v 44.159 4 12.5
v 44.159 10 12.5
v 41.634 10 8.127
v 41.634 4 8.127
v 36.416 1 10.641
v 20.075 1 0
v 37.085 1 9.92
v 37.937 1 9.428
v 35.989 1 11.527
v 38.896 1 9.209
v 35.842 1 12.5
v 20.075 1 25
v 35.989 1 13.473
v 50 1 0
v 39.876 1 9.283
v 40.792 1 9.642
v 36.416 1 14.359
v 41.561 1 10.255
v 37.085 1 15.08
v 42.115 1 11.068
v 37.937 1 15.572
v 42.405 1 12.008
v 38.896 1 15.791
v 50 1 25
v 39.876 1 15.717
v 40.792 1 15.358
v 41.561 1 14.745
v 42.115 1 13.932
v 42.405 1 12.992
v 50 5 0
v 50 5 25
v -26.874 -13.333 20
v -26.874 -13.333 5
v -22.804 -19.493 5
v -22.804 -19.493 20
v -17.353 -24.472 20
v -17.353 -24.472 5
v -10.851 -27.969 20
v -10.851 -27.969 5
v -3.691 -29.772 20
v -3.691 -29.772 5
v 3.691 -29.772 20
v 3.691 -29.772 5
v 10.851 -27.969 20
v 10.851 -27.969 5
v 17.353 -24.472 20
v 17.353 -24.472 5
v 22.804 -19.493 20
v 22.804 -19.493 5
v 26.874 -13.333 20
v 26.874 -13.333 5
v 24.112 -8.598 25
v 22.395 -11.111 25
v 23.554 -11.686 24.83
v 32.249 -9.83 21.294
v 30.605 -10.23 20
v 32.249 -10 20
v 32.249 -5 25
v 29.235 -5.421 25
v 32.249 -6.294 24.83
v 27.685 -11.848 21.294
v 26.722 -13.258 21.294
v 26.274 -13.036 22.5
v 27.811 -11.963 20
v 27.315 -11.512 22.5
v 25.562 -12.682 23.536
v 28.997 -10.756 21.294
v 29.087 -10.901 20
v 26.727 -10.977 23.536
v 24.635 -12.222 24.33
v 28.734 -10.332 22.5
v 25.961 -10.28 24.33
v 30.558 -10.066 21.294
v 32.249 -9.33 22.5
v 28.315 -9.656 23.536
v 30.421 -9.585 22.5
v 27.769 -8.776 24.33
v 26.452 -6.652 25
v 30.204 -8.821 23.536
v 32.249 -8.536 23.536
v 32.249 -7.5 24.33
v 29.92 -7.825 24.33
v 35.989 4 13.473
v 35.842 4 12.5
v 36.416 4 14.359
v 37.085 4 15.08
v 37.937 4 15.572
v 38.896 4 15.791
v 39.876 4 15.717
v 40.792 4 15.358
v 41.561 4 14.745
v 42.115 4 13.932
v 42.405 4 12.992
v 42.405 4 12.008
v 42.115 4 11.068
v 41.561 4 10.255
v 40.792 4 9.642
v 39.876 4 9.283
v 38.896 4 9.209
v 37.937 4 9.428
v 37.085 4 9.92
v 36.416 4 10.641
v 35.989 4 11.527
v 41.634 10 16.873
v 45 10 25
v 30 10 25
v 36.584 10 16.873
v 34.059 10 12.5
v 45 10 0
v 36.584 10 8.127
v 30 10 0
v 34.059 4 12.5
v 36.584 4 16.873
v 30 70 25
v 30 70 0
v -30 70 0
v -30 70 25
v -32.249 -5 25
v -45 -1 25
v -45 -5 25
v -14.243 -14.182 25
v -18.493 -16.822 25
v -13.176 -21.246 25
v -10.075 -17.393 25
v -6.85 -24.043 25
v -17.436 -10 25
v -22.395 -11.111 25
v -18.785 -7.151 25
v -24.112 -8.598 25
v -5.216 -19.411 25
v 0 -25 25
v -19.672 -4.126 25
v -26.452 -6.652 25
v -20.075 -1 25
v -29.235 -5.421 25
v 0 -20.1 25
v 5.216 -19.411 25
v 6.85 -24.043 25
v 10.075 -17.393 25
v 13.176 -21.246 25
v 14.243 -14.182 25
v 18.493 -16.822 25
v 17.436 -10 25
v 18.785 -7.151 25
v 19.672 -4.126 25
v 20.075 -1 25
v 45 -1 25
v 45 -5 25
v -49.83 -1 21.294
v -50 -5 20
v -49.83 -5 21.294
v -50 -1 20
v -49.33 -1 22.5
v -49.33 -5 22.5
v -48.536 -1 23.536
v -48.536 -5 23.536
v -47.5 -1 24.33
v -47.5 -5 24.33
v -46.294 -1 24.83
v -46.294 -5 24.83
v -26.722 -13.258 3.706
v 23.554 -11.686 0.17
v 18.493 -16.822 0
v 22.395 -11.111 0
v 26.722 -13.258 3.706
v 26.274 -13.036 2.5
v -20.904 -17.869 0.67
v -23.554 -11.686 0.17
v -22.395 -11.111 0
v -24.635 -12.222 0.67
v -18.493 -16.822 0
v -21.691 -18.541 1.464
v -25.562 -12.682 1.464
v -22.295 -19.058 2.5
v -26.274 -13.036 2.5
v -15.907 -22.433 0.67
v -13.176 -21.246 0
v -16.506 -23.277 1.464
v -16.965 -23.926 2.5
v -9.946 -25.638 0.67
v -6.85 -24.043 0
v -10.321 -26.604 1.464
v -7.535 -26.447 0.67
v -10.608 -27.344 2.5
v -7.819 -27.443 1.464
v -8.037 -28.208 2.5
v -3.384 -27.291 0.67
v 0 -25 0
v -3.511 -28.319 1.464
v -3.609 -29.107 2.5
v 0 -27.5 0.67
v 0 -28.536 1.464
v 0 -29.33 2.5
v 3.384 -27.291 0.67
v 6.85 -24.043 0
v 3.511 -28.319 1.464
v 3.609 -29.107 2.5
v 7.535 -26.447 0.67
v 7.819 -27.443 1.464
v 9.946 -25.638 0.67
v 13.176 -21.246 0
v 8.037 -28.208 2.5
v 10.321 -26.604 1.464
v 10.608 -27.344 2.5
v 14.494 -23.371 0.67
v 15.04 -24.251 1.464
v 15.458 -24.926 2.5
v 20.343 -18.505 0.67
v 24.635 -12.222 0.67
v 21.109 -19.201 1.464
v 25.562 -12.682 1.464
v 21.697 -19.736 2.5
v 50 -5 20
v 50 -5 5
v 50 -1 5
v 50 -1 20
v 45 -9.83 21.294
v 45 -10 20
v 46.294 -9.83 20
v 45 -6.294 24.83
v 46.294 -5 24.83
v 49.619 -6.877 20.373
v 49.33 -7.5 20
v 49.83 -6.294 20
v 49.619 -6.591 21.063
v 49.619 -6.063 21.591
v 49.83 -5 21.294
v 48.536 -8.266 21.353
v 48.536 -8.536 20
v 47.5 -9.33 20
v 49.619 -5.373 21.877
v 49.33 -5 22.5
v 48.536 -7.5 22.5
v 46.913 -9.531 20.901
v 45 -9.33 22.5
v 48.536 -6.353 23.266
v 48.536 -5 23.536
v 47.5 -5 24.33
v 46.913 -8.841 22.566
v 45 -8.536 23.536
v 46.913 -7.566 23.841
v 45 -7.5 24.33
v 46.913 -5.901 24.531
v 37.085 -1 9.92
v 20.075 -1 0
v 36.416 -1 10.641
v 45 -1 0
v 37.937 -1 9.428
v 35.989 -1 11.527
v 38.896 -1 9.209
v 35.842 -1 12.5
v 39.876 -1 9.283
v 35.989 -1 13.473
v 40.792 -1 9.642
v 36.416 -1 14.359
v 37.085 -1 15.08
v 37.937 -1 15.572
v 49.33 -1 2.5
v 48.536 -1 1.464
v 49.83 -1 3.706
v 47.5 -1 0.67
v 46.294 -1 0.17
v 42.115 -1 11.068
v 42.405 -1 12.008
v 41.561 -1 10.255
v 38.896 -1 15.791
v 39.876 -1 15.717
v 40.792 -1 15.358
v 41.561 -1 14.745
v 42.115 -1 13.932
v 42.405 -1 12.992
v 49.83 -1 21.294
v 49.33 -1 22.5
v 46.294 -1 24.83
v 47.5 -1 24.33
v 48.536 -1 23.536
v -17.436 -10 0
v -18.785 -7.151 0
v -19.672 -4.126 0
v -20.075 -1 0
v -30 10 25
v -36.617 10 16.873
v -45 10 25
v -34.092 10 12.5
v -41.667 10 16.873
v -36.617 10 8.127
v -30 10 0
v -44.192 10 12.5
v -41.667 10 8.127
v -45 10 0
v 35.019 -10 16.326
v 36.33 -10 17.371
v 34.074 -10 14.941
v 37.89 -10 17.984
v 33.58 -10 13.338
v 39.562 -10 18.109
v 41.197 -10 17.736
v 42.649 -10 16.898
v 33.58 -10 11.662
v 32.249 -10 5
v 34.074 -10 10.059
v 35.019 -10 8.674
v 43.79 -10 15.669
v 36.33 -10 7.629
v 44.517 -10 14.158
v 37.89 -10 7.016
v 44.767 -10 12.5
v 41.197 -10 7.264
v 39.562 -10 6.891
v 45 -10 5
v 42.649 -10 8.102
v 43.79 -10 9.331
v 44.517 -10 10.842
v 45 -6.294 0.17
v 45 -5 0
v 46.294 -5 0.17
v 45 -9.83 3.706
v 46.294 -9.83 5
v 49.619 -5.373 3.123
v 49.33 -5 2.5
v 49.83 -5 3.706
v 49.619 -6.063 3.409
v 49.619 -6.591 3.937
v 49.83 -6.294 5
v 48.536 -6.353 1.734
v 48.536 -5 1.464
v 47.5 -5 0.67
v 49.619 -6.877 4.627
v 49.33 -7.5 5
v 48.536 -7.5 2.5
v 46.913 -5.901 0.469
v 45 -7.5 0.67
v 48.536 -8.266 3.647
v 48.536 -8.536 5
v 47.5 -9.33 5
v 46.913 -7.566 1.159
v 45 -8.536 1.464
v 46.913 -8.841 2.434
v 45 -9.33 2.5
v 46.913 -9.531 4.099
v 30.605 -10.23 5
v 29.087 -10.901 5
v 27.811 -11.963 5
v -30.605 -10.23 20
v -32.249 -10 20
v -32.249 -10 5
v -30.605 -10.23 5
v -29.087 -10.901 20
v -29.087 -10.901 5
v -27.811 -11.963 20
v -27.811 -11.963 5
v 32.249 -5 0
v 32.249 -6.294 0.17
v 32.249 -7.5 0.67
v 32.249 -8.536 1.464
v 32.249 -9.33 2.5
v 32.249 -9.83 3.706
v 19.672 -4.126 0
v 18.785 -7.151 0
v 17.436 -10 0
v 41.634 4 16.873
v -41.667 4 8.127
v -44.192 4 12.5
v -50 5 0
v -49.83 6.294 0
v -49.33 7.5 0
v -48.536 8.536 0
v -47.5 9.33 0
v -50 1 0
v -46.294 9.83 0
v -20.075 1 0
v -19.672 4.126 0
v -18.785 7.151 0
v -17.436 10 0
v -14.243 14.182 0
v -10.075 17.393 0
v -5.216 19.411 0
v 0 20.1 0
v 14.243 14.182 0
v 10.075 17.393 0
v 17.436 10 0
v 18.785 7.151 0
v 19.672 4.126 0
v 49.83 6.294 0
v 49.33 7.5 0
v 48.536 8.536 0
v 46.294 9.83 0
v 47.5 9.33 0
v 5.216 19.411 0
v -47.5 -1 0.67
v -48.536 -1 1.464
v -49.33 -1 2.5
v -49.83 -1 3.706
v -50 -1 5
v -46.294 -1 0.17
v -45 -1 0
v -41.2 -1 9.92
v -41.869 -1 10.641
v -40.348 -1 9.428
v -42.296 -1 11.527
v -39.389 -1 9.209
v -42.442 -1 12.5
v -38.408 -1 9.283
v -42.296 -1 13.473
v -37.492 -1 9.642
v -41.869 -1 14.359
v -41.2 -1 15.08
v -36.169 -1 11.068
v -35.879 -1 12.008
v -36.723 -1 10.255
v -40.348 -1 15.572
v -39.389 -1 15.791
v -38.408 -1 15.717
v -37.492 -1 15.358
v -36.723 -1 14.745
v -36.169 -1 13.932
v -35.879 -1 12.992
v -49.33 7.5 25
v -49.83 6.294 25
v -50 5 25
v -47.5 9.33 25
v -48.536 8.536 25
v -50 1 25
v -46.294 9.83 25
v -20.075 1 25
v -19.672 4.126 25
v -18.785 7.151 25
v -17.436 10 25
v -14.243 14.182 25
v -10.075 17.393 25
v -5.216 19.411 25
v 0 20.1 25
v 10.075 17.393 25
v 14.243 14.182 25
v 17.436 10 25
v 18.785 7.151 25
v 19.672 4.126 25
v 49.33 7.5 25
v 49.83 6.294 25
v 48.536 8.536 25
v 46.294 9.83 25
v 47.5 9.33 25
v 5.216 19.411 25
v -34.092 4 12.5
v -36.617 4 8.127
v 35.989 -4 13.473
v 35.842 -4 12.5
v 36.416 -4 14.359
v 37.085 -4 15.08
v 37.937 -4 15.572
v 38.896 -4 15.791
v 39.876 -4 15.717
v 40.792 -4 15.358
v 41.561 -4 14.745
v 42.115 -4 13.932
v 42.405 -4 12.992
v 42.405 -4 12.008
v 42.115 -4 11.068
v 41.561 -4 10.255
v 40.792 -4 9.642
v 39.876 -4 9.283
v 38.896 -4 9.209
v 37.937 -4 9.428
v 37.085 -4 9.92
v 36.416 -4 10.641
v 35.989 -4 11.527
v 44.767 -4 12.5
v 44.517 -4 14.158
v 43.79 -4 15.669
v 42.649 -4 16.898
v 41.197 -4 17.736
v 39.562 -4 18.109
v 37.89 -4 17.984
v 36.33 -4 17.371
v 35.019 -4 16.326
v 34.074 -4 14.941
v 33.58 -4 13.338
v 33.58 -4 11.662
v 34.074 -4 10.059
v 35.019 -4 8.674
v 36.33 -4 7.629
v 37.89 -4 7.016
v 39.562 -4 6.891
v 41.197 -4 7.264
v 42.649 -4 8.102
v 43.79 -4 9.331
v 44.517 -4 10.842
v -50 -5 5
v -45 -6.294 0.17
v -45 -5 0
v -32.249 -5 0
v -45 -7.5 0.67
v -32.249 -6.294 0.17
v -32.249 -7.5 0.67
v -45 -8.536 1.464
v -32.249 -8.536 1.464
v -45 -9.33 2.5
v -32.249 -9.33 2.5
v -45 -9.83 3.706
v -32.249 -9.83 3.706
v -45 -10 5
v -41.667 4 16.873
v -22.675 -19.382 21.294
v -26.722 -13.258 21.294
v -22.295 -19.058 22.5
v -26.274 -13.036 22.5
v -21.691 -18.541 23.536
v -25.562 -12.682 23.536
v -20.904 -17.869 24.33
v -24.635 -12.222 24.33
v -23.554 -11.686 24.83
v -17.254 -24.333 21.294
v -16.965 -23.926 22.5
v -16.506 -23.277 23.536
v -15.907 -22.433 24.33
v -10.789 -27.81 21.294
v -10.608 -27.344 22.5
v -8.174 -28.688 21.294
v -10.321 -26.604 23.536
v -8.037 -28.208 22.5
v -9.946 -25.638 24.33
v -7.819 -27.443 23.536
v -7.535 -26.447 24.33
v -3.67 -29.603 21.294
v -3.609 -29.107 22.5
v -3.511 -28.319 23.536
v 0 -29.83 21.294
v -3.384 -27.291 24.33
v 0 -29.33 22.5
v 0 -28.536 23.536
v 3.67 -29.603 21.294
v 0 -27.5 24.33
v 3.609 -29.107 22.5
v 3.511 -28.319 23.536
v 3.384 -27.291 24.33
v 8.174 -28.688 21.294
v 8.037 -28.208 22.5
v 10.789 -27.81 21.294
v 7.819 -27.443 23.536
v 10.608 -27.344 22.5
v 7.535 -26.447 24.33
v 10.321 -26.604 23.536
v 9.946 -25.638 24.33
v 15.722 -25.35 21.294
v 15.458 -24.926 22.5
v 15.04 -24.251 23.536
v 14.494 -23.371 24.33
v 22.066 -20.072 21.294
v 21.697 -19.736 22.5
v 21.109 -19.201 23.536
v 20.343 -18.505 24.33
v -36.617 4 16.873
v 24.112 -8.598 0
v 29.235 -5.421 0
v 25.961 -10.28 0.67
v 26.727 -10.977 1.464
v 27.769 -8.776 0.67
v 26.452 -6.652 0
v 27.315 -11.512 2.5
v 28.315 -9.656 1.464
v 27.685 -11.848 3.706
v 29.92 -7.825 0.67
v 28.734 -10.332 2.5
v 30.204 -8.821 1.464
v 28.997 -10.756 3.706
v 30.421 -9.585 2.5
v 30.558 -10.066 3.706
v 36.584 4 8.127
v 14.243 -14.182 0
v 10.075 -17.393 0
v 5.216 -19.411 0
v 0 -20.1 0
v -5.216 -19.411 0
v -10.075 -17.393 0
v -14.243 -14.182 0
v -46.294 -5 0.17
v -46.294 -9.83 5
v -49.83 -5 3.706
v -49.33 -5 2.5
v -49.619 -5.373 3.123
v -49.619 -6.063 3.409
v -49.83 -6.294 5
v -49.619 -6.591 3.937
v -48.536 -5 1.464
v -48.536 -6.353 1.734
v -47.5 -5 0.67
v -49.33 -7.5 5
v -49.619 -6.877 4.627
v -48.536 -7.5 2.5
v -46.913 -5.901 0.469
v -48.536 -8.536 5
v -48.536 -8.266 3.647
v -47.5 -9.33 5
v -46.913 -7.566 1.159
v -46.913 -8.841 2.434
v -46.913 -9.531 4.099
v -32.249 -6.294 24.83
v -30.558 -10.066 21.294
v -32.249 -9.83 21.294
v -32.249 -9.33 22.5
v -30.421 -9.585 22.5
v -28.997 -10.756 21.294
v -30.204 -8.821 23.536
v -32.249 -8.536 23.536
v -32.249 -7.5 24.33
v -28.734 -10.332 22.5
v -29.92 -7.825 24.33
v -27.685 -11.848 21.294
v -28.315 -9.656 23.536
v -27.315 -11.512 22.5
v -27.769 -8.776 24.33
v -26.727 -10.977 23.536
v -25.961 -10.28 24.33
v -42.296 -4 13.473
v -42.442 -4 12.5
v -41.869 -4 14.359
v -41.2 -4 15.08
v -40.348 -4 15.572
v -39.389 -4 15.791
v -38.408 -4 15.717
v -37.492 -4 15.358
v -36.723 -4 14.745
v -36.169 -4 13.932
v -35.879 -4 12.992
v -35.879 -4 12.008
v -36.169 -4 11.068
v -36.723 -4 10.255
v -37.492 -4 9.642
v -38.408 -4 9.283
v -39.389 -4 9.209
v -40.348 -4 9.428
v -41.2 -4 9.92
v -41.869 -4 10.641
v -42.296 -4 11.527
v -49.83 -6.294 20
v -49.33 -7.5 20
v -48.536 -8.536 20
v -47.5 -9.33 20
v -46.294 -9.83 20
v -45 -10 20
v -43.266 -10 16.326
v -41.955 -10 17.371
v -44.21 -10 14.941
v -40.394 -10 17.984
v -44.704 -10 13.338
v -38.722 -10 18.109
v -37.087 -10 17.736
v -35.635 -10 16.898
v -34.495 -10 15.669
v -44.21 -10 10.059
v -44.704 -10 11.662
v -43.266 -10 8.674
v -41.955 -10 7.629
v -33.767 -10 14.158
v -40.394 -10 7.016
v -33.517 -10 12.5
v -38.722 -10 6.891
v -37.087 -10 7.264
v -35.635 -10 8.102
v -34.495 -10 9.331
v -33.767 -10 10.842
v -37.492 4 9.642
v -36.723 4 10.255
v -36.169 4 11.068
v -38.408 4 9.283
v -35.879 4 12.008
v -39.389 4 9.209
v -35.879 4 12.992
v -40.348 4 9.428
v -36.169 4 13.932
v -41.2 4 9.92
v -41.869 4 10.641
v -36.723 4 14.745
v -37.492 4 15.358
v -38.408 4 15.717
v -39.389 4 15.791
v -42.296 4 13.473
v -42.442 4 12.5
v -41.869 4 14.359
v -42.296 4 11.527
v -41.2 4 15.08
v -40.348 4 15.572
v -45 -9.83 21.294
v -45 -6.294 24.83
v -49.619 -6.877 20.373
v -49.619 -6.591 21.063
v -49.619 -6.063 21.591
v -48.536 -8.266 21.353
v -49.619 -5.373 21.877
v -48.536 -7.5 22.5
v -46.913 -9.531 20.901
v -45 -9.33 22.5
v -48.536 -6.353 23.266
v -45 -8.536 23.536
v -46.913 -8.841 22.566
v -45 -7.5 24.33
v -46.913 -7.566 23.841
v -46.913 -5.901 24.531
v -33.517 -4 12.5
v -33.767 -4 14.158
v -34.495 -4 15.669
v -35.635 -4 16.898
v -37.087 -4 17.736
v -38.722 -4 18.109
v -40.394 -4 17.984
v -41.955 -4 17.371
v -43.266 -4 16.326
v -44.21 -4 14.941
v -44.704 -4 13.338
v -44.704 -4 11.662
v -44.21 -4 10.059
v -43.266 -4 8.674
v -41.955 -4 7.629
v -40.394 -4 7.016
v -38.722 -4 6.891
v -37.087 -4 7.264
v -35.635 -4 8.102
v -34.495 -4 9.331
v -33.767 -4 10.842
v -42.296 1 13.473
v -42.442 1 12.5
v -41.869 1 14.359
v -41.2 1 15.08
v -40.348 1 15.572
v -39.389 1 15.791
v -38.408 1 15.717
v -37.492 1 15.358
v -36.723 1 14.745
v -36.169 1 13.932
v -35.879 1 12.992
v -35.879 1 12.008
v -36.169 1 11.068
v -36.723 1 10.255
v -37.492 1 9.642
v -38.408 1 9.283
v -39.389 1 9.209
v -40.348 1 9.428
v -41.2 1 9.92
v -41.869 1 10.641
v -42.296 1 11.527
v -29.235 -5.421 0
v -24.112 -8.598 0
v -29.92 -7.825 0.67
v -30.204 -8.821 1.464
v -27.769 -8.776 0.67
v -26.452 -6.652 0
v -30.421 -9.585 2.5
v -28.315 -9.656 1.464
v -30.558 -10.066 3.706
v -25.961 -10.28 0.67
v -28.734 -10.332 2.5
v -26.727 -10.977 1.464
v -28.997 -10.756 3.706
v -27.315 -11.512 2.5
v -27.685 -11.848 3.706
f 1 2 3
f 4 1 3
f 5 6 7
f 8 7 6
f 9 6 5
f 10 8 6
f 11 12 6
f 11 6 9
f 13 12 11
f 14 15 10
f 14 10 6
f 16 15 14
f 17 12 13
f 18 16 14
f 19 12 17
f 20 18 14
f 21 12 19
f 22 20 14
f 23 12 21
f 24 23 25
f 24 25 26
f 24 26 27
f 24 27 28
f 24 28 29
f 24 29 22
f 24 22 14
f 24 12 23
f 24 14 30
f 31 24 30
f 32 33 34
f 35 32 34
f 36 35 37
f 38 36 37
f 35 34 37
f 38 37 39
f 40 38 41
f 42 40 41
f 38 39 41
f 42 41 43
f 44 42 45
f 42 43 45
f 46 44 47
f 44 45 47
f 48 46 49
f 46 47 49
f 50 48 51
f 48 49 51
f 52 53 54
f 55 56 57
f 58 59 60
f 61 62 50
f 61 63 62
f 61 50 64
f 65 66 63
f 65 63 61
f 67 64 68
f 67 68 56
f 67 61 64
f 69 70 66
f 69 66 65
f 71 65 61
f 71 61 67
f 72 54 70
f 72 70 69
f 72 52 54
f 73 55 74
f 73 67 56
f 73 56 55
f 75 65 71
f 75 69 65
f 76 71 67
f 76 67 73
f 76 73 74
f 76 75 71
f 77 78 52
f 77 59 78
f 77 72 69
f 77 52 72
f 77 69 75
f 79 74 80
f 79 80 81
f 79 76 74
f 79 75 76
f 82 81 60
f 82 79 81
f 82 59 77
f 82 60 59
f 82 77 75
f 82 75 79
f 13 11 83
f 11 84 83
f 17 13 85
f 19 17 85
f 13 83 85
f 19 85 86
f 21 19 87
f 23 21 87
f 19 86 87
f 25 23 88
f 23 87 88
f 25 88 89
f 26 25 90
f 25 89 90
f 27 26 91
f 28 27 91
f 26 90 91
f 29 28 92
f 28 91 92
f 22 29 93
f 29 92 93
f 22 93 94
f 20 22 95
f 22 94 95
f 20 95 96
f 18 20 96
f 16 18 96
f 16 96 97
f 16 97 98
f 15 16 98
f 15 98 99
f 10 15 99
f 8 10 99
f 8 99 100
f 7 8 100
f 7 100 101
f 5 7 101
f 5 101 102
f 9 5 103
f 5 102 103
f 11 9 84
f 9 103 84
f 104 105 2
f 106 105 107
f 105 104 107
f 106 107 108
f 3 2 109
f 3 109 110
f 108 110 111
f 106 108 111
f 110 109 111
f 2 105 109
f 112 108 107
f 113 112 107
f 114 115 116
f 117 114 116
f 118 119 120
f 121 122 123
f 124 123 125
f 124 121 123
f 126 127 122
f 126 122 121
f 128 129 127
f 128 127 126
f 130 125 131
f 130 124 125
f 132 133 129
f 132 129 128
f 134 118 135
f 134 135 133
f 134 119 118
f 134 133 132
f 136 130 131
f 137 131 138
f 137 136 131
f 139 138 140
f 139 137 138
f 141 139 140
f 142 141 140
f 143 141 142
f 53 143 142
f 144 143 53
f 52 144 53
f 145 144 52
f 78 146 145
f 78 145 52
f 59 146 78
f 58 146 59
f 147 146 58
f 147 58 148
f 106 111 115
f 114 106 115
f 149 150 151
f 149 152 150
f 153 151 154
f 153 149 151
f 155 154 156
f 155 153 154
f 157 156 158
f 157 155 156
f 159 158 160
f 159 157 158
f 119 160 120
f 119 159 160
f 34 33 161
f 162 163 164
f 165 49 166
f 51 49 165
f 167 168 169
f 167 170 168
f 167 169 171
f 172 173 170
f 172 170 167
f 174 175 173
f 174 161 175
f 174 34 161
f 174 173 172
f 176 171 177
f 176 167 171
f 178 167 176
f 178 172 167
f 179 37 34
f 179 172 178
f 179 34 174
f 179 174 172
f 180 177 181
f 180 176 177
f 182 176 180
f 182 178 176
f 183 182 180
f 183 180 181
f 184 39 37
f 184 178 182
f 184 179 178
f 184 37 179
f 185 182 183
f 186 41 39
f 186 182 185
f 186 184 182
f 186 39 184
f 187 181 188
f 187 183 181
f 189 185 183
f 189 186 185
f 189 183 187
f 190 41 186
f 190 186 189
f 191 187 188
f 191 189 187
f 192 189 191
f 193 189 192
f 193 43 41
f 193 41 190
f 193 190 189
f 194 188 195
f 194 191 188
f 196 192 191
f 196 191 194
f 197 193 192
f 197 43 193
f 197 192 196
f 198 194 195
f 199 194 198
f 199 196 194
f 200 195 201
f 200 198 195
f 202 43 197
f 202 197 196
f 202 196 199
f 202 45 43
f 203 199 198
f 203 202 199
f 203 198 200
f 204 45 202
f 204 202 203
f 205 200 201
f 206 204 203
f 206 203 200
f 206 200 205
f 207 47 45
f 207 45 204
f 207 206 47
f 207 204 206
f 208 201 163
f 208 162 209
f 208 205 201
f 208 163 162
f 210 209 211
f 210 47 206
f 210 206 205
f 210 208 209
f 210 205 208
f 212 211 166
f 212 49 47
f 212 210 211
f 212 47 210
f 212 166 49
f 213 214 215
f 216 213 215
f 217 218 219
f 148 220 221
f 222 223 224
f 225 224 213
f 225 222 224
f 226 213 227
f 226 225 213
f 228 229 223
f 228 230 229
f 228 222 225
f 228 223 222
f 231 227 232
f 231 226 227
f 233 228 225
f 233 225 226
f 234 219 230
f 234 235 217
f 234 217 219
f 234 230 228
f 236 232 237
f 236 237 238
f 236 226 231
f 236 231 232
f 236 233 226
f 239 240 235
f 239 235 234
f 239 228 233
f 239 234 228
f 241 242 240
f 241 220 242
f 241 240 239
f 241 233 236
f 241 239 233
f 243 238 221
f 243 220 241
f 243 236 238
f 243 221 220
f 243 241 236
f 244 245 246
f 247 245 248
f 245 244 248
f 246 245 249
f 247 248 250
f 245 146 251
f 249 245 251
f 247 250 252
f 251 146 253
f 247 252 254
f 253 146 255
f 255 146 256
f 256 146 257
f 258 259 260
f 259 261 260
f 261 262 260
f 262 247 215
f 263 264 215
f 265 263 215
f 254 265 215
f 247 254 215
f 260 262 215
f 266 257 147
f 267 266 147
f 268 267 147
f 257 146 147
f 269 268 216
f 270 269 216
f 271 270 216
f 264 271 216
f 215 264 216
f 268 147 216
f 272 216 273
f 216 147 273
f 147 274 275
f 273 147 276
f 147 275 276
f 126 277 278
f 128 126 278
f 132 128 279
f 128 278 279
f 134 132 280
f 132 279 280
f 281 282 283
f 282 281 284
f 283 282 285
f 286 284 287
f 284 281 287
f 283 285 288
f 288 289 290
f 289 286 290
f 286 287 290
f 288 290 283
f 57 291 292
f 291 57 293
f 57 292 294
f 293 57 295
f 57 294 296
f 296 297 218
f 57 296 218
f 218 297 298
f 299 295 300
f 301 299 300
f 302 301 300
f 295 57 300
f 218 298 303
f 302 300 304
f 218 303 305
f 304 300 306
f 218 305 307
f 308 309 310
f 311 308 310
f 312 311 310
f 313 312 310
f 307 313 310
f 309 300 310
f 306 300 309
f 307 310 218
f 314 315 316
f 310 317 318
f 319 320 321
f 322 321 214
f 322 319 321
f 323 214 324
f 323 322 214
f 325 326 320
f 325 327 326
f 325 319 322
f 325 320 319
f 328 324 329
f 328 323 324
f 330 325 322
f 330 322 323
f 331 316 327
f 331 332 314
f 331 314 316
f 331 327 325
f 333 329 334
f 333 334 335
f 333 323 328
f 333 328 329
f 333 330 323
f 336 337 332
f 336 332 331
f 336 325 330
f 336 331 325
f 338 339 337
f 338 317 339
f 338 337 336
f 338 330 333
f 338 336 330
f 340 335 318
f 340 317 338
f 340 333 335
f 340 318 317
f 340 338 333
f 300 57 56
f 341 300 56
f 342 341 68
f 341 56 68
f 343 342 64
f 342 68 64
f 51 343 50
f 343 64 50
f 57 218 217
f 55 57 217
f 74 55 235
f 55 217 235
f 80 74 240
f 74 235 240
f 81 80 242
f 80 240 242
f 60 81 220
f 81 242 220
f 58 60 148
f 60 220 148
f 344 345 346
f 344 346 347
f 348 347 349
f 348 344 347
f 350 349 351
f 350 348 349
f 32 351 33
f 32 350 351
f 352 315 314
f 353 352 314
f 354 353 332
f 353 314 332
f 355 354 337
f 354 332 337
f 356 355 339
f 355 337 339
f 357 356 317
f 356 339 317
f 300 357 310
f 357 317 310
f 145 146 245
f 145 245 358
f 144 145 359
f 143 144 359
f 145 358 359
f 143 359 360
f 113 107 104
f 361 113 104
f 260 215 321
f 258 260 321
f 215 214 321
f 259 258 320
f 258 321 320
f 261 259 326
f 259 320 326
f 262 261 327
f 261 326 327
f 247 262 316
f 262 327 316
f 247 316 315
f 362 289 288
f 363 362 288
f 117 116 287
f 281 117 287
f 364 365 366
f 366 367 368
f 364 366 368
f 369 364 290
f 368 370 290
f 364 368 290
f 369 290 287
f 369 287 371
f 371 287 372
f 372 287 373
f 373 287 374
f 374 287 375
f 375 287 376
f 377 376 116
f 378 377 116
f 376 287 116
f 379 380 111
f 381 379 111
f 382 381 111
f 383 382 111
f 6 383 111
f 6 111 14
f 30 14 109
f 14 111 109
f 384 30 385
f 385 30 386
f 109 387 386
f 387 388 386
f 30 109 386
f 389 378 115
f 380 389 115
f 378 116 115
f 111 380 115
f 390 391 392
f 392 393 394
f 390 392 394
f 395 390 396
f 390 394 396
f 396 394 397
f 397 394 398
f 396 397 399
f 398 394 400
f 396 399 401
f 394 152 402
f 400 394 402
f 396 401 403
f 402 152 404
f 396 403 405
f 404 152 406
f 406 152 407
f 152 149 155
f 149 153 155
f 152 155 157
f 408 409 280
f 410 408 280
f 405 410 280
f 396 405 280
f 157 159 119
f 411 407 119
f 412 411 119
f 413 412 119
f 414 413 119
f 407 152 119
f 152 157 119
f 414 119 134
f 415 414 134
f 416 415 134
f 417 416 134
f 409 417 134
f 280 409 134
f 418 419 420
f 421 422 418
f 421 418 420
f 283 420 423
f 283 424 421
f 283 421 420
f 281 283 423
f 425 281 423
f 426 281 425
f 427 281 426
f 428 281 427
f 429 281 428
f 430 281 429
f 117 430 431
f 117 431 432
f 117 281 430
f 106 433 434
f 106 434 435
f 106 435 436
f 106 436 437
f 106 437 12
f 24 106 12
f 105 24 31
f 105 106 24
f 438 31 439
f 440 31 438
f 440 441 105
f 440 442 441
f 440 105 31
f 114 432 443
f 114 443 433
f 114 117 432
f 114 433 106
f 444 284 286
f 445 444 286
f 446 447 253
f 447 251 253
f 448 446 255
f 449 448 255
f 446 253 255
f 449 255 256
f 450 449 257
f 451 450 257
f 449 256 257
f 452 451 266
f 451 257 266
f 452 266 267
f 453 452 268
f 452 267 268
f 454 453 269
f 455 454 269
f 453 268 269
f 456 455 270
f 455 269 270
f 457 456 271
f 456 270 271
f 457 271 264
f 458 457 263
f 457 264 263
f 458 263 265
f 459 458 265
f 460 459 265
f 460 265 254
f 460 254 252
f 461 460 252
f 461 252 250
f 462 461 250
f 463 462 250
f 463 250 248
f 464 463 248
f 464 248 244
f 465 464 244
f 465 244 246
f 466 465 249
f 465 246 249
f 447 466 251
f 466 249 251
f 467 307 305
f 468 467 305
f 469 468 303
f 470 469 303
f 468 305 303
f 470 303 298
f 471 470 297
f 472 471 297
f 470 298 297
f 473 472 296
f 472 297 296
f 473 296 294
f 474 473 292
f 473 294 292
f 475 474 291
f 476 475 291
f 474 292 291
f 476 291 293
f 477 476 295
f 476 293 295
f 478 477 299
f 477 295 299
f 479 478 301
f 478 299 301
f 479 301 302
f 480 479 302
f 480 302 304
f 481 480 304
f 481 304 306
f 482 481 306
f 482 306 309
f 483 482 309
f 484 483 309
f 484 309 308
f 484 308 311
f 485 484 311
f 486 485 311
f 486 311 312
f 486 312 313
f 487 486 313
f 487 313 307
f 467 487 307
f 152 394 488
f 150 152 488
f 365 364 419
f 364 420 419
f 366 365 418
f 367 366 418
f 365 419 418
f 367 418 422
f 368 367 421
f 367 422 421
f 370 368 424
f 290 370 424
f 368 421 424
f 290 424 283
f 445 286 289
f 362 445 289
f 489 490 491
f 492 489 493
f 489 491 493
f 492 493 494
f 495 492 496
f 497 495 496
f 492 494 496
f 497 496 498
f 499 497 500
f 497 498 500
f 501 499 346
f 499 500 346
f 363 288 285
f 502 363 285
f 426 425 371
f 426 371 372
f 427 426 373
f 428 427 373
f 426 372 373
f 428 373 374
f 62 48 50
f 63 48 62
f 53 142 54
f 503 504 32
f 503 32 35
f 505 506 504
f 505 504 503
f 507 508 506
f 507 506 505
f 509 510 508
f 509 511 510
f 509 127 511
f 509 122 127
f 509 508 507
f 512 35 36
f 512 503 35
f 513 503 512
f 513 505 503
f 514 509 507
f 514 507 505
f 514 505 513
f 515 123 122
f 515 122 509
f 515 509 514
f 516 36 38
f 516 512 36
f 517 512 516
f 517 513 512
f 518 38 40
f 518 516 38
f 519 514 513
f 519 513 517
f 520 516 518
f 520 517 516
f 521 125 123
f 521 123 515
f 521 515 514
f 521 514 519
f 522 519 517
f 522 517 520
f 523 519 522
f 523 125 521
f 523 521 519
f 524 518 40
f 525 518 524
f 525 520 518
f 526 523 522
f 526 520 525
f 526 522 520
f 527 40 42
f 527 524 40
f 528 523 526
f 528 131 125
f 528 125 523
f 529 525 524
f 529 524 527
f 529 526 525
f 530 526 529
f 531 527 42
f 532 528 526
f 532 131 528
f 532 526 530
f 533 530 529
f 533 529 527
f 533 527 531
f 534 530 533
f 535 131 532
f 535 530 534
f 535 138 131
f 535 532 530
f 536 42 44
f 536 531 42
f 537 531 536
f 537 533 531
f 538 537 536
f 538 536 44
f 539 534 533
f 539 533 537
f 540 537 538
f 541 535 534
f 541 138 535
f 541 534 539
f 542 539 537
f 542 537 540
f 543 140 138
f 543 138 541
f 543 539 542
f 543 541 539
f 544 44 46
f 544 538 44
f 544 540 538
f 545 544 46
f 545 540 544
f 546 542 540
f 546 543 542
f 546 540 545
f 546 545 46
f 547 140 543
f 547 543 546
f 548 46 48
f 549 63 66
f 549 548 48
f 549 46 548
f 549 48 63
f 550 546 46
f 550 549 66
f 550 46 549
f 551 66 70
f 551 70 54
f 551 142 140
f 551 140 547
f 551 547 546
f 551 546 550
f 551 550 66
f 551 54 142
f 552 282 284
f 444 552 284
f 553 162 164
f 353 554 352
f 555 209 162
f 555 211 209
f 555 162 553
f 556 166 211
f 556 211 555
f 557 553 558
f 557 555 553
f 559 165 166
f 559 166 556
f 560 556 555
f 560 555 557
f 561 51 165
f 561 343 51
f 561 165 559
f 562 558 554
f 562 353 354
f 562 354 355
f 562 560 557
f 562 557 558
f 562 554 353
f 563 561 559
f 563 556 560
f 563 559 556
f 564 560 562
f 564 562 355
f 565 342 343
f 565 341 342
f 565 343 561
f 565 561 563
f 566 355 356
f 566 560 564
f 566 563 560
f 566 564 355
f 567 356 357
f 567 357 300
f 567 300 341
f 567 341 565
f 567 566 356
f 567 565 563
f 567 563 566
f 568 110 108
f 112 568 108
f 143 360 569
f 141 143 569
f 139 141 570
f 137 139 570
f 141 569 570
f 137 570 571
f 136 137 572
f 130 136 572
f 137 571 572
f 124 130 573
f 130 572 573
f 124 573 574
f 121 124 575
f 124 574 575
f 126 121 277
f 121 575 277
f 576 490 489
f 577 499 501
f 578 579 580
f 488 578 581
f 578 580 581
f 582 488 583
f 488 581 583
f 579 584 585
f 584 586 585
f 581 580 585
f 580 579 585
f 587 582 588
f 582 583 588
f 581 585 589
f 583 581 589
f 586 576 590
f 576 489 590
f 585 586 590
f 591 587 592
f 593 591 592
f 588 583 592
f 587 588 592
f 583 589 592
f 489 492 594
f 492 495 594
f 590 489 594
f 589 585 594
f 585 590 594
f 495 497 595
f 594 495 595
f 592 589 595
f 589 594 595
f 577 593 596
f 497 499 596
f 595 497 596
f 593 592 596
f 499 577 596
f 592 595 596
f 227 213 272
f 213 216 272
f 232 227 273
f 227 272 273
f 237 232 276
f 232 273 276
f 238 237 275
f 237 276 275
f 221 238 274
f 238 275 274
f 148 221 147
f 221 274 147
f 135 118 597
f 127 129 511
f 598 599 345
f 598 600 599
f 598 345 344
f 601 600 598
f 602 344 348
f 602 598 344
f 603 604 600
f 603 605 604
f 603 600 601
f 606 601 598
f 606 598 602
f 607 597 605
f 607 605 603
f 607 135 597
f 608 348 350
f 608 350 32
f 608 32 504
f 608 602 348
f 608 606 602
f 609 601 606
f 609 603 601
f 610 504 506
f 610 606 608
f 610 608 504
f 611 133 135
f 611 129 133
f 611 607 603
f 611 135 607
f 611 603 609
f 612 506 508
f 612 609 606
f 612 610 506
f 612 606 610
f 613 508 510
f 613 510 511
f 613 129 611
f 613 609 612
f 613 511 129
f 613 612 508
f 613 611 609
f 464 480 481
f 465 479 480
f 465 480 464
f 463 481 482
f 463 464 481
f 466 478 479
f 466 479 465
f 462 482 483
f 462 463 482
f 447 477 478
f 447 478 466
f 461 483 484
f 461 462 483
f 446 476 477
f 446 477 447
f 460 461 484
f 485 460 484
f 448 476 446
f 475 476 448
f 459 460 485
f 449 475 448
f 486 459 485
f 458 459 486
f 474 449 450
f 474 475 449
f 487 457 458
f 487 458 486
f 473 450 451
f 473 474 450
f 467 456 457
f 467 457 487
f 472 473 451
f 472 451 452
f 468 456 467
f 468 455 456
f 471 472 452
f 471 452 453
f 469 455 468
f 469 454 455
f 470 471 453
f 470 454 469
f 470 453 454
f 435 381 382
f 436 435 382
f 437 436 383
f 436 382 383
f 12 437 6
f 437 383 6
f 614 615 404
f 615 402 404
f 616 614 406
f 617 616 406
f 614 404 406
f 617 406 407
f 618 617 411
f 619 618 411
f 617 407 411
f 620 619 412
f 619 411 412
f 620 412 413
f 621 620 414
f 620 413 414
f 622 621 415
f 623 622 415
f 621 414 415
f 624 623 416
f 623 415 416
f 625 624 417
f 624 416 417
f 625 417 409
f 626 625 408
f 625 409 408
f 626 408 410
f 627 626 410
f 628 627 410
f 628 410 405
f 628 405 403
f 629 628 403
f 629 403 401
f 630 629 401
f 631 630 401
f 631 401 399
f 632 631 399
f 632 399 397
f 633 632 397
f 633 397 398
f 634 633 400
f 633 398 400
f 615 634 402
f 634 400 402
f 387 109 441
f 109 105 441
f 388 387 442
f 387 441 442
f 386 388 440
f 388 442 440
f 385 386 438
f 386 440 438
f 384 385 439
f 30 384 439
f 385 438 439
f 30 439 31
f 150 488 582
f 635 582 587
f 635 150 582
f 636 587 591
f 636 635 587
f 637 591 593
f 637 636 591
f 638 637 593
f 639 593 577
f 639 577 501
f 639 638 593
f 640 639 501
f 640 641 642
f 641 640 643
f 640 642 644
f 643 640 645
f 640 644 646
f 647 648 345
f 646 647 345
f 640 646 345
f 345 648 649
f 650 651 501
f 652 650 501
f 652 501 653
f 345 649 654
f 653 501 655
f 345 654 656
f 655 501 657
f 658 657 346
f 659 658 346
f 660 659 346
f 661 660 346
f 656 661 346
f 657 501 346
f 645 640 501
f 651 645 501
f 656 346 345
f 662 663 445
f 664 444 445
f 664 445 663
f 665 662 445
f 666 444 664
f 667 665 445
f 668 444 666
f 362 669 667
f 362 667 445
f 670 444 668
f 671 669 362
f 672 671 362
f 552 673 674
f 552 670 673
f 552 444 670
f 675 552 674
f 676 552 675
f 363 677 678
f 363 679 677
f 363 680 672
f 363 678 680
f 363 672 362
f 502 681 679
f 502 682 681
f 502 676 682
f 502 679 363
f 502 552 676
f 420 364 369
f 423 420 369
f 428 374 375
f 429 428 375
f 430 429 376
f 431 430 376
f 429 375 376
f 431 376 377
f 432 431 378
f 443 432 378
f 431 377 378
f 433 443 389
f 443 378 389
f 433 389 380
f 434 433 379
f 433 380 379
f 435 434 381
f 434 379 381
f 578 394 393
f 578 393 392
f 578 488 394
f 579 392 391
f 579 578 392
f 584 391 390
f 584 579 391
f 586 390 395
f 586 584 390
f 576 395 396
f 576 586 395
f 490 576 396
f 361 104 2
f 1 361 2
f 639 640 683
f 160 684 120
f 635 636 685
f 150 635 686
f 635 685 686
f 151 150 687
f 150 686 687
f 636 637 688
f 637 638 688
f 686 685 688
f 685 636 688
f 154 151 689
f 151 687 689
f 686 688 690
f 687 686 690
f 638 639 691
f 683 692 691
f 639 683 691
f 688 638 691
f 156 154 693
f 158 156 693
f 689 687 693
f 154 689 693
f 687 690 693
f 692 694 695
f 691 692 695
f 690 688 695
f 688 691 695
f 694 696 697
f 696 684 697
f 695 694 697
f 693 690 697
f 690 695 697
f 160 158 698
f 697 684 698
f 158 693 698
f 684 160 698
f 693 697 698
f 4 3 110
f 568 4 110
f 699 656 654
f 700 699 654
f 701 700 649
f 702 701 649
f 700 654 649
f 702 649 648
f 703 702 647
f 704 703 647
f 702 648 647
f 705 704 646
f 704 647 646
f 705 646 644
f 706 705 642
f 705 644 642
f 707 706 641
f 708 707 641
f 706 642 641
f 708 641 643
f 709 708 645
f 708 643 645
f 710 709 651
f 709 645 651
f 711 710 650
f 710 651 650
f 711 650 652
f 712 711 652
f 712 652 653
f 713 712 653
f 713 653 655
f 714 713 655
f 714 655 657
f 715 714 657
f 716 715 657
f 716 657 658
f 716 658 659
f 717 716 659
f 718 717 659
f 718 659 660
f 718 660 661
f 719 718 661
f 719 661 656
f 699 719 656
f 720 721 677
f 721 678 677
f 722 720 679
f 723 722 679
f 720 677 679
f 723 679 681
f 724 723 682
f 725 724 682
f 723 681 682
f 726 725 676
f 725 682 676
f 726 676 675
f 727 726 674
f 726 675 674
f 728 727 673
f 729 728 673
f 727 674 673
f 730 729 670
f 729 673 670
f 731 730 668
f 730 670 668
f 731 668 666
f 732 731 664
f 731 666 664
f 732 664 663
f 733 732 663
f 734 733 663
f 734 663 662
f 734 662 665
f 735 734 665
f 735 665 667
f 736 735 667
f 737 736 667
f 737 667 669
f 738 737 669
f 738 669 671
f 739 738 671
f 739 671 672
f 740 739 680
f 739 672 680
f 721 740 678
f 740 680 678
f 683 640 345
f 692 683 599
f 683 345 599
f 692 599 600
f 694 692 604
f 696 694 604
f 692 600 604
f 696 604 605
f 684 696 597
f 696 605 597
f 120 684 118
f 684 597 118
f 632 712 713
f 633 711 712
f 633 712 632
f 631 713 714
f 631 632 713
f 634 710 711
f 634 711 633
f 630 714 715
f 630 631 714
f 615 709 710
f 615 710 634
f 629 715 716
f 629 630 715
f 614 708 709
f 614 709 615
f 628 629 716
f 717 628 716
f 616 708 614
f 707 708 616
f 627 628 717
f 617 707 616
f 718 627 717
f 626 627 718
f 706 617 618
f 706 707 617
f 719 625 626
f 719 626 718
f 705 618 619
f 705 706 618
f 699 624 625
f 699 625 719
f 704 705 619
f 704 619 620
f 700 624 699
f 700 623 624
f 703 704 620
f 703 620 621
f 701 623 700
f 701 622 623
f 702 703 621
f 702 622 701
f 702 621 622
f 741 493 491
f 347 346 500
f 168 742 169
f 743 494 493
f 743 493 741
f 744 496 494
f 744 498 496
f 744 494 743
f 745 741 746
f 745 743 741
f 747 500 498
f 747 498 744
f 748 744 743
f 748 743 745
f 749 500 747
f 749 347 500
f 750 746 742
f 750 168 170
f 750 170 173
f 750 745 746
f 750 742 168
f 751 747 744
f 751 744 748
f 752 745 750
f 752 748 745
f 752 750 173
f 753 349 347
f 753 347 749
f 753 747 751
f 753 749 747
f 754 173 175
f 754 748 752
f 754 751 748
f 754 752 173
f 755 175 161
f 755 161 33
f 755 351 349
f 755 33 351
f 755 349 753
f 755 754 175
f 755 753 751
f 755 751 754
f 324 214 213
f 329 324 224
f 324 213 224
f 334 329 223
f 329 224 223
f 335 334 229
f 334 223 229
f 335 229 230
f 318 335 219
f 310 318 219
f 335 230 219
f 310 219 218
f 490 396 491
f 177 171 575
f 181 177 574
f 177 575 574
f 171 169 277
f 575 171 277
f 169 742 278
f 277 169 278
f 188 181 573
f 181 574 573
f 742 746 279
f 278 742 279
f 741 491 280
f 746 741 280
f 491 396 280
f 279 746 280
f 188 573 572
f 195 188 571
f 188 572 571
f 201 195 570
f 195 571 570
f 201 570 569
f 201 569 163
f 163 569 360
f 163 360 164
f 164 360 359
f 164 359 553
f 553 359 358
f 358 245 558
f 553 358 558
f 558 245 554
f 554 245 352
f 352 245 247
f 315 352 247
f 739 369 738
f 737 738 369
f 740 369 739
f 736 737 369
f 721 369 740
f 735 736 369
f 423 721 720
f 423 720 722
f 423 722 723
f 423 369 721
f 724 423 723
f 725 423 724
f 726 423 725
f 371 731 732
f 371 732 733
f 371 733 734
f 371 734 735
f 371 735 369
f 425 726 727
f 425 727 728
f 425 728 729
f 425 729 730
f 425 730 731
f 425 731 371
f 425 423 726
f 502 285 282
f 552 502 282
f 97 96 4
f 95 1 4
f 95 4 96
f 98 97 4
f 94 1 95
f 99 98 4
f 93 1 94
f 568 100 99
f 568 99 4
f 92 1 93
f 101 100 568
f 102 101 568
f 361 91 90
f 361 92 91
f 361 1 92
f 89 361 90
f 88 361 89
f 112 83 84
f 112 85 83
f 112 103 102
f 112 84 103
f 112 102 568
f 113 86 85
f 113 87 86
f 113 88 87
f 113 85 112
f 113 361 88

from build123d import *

# Parameters (mm, degrees)
F1_DEPTH             = 25
F4_D                 = 6.6
F4_CBORE_D           = 11.25
F4_CBORE_DEPTH       = 6
F4_ON_F3_D           = 6.6
F4_ON_F3_CBORE_D     = 11.25
F4_ON_F3_CBORE_DEPTH = 6
F5_R                 = 3.3
F6_DEPTH             = 6
F7_R                 = 6
F8_W                 = 100
F8_H                 = 25
F9_DEPTH             = 1
F10_R                = 5
F11_R                = 5


with BuildPart() as f1:
    # F0 (on Top) → F1 (new body)
    with BuildSketch(Plane.XY):
        with BuildLine():
            ThreePointArc((-28.2842712475, 10), (0, 30), (28.2842712475, 10))
            Line((28.2842712475, 10), (30, 10))
            Line((30, 10), (30, 70))
            Line((30, 70), (-30, 70))
            Line((-30, 70), (-30, 10))
            Line((-30, 10), (-28.2842712475, 10))
        make_face()
        with BuildLine():
            Line((30, 10), (30, 0))
            ThreePointArc((30, 0), (29.5679567896, -5.0730593618), (28.2842712475, -10))
            Line((28.2842712475, -10), (50, -10))
            Line((50, -10), (50, 10))
            Line((50, 10), (30, 10))
        make_face()
        with BuildLine():
            ThreePointArc((-17.4358825415, 10), (0, 20.1), (17.4358825415, 10))
            Line((17.4358825415, 10), (28.2842712475, 10))
            ThreePointArc((28.2842712475, 10), (0, 30), (-28.2842712475, 10))
            Line((-28.2842712475, 10), (-17.4358825415, 10))
        make_face()
        with BuildLine():
            Line((-30, 0), (-20.1, 0))
            ThreePointArc((-20.1, 0), (-19.4225544031, 5.1743966275), (-17.4358825415, 10))
            Line((-17.4358825415, 10), (-28.2842712475, 10))
            ThreePointArc((-28.2842712475, 10), (-29.5679567896, 5.0730593618), (-30, 0))
        make_face()
        with BuildLine():
            ThreePointArc((-17.4358825415, -10), (-19.4225544031, -5.1743966275), (-20.1, 0))
            Line((-20.1, 0), (-30, 0))
            ThreePointArc((-30, 0), (-29.5679567896, -5.0730593618), (-28.2842712475, -10))
            Line((-28.2842712475, -10), (-17.4358825415, -10))
        make_face()
        with BuildLine():
            Line((28.2842712475, -10), (17.4358825415, -10))
            ThreePointArc((17.4358825415, -10), (0, -20.1), (-17.4358825415, -10))
            Line((-17.4358825415, -10), (-28.2842712475, -10))
            ThreePointArc((-28.2842712475, -10), (0, -30), (28.2842712475, -10))
        make_face()
        with BuildLine():
            Line((30, 0), (20.1, 0))
            ThreePointArc((20.1, 0), (19.4225544031, -5.1743966275), (17.4358825415, -10))
            Line((17.4358825415, -10), (28.2842712475, -10))
            ThreePointArc((28.2842712475, -10), (29.5679567896, -5.0730593618), (30, 0))
        make_face()
        with BuildLine():
            ThreePointArc((17.4358825415, 10), (19.4225544031, 5.1743966275), (20.1, 0))
            Line((20.1, 0), (30, 0))
            ThreePointArc((30, 0), (29.5679567896, 5.0730593618), (28.2842712475, 10))
            Line((28.2842712475, 10), (17.4358825415, 10))
        make_face()
        with BuildLine():
            ThreePointArc((-28.2842712475, -10), (-29.5679567896, -5.0730593618), (-30, 0))
            Line((-30, 0), (-30, 10))
            Line((-30, 10), (-50, 10))
            Line((-50, 10), (-50, -10))
            Line((-50, -10), (-28.2842712475, -10))
        make_face()
        with BuildLine():
            Line((-30, 10), (-30, 0))
            ThreePointArc((-30, 0), (-29.5679567896, 5.0730593618), (-28.2842712475, 10))
            Line((-28.2842712475, 10), (-30, 10))
        make_face()
        with BuildLine():
            ThreePointArc((28.2842712475, 10), (29.5679567896, 5.0730593618), (30, 0))
            Line((30, 0), (30, 10))
            Line((30, 10), (28.2842712475, 10))
        make_face()
    extrude(amount=F1_DEPTH)

    # F4 (through all)
    with Locations(Plane.XZ.offset(10)):
        with Locations((-39.1421356237, 12.5)):
            CounterBoreHole(F4_D / 2, F4_CBORE_D / 2, F4_CBORE_DEPTH)

    # F4 on F3 (through all)
    with Locations(Plane.XZ.offset(10)):
        with Locations((39.1421356237, 12.5)):
            CounterBoreHole(F4_ON_F3_D / 2, F4_ON_F3_CBORE_D / 2, F4_ON_F3_CBORE_DEPTH)

    # F5 (on face) → F6 (cut)
    with BuildSketch(Plane(origin=(0, 10, 0), x_dir=(-1, 0, 0), z_dir=(0, 1, 0))):
        Polygon((-34.0585892916, 12.5), (-36.5835892916, 16.8734282891), (-41.6335892916, 16.8734282891), (-44.1585892916, 12.5), (-41.6335892916, 8.1265717109), (-36.5835892916, 8.1265717109), align=None)
        Polygon((44.1921356237, 12.5), (41.6671356237, 16.8734282891), (36.6171356237, 16.8734282891), (34.0921356237, 12.5), (36.6171356237, 8.1265717109), (41.6671356237, 8.1265717109), align=None)
        with Locations((39.1421356237, 12.5)):
            Circle(F5_R, mode=Mode.SUBTRACT)
    extrude(amount=-F6_DEPTH, mode=Mode.SUBTRACT)

    # F7
    f7_edges = [f1.edges().sort_by_distance(p)[0] for p in [
        (28.284271, -10, 12.5),
        (-28.284271, -10, 12.5),
    ]]
    fillet(f7_edges, radius=F7_R)

    # F8 (on Front) → F9 (cut, symmetric)
    with BuildSketch(Plane.XZ):
        with Locations((0, 12.5)):
            Rectangle(F8_W, F8_H)
    extrude(amount=F9_DEPTH, both=True, mode=Mode.SUBTRACT)

    # F10
    f10_edges = [f1.edges().sort_by_distance(p)[0] for p in [
        (0, -30, 0),
        (-26.874192, -13.333333, 12.5),
        (26.874192, -13.333333, 12.5),
        (0, -30, 25),
    ]]
    fillet(f10_edges, radius=F10_R)

    # F11
    f11_edges = [f1.edges().sort_by_distance(p)[0] for p in [
        (50, -10, 12.5),
        (50, 10, 12.5),
        (-50, -10, 12.5),
        (-50, 10, 12.5),
    ]]
    fillet(f11_edges, radius=F11_R)


solid = f1.part
